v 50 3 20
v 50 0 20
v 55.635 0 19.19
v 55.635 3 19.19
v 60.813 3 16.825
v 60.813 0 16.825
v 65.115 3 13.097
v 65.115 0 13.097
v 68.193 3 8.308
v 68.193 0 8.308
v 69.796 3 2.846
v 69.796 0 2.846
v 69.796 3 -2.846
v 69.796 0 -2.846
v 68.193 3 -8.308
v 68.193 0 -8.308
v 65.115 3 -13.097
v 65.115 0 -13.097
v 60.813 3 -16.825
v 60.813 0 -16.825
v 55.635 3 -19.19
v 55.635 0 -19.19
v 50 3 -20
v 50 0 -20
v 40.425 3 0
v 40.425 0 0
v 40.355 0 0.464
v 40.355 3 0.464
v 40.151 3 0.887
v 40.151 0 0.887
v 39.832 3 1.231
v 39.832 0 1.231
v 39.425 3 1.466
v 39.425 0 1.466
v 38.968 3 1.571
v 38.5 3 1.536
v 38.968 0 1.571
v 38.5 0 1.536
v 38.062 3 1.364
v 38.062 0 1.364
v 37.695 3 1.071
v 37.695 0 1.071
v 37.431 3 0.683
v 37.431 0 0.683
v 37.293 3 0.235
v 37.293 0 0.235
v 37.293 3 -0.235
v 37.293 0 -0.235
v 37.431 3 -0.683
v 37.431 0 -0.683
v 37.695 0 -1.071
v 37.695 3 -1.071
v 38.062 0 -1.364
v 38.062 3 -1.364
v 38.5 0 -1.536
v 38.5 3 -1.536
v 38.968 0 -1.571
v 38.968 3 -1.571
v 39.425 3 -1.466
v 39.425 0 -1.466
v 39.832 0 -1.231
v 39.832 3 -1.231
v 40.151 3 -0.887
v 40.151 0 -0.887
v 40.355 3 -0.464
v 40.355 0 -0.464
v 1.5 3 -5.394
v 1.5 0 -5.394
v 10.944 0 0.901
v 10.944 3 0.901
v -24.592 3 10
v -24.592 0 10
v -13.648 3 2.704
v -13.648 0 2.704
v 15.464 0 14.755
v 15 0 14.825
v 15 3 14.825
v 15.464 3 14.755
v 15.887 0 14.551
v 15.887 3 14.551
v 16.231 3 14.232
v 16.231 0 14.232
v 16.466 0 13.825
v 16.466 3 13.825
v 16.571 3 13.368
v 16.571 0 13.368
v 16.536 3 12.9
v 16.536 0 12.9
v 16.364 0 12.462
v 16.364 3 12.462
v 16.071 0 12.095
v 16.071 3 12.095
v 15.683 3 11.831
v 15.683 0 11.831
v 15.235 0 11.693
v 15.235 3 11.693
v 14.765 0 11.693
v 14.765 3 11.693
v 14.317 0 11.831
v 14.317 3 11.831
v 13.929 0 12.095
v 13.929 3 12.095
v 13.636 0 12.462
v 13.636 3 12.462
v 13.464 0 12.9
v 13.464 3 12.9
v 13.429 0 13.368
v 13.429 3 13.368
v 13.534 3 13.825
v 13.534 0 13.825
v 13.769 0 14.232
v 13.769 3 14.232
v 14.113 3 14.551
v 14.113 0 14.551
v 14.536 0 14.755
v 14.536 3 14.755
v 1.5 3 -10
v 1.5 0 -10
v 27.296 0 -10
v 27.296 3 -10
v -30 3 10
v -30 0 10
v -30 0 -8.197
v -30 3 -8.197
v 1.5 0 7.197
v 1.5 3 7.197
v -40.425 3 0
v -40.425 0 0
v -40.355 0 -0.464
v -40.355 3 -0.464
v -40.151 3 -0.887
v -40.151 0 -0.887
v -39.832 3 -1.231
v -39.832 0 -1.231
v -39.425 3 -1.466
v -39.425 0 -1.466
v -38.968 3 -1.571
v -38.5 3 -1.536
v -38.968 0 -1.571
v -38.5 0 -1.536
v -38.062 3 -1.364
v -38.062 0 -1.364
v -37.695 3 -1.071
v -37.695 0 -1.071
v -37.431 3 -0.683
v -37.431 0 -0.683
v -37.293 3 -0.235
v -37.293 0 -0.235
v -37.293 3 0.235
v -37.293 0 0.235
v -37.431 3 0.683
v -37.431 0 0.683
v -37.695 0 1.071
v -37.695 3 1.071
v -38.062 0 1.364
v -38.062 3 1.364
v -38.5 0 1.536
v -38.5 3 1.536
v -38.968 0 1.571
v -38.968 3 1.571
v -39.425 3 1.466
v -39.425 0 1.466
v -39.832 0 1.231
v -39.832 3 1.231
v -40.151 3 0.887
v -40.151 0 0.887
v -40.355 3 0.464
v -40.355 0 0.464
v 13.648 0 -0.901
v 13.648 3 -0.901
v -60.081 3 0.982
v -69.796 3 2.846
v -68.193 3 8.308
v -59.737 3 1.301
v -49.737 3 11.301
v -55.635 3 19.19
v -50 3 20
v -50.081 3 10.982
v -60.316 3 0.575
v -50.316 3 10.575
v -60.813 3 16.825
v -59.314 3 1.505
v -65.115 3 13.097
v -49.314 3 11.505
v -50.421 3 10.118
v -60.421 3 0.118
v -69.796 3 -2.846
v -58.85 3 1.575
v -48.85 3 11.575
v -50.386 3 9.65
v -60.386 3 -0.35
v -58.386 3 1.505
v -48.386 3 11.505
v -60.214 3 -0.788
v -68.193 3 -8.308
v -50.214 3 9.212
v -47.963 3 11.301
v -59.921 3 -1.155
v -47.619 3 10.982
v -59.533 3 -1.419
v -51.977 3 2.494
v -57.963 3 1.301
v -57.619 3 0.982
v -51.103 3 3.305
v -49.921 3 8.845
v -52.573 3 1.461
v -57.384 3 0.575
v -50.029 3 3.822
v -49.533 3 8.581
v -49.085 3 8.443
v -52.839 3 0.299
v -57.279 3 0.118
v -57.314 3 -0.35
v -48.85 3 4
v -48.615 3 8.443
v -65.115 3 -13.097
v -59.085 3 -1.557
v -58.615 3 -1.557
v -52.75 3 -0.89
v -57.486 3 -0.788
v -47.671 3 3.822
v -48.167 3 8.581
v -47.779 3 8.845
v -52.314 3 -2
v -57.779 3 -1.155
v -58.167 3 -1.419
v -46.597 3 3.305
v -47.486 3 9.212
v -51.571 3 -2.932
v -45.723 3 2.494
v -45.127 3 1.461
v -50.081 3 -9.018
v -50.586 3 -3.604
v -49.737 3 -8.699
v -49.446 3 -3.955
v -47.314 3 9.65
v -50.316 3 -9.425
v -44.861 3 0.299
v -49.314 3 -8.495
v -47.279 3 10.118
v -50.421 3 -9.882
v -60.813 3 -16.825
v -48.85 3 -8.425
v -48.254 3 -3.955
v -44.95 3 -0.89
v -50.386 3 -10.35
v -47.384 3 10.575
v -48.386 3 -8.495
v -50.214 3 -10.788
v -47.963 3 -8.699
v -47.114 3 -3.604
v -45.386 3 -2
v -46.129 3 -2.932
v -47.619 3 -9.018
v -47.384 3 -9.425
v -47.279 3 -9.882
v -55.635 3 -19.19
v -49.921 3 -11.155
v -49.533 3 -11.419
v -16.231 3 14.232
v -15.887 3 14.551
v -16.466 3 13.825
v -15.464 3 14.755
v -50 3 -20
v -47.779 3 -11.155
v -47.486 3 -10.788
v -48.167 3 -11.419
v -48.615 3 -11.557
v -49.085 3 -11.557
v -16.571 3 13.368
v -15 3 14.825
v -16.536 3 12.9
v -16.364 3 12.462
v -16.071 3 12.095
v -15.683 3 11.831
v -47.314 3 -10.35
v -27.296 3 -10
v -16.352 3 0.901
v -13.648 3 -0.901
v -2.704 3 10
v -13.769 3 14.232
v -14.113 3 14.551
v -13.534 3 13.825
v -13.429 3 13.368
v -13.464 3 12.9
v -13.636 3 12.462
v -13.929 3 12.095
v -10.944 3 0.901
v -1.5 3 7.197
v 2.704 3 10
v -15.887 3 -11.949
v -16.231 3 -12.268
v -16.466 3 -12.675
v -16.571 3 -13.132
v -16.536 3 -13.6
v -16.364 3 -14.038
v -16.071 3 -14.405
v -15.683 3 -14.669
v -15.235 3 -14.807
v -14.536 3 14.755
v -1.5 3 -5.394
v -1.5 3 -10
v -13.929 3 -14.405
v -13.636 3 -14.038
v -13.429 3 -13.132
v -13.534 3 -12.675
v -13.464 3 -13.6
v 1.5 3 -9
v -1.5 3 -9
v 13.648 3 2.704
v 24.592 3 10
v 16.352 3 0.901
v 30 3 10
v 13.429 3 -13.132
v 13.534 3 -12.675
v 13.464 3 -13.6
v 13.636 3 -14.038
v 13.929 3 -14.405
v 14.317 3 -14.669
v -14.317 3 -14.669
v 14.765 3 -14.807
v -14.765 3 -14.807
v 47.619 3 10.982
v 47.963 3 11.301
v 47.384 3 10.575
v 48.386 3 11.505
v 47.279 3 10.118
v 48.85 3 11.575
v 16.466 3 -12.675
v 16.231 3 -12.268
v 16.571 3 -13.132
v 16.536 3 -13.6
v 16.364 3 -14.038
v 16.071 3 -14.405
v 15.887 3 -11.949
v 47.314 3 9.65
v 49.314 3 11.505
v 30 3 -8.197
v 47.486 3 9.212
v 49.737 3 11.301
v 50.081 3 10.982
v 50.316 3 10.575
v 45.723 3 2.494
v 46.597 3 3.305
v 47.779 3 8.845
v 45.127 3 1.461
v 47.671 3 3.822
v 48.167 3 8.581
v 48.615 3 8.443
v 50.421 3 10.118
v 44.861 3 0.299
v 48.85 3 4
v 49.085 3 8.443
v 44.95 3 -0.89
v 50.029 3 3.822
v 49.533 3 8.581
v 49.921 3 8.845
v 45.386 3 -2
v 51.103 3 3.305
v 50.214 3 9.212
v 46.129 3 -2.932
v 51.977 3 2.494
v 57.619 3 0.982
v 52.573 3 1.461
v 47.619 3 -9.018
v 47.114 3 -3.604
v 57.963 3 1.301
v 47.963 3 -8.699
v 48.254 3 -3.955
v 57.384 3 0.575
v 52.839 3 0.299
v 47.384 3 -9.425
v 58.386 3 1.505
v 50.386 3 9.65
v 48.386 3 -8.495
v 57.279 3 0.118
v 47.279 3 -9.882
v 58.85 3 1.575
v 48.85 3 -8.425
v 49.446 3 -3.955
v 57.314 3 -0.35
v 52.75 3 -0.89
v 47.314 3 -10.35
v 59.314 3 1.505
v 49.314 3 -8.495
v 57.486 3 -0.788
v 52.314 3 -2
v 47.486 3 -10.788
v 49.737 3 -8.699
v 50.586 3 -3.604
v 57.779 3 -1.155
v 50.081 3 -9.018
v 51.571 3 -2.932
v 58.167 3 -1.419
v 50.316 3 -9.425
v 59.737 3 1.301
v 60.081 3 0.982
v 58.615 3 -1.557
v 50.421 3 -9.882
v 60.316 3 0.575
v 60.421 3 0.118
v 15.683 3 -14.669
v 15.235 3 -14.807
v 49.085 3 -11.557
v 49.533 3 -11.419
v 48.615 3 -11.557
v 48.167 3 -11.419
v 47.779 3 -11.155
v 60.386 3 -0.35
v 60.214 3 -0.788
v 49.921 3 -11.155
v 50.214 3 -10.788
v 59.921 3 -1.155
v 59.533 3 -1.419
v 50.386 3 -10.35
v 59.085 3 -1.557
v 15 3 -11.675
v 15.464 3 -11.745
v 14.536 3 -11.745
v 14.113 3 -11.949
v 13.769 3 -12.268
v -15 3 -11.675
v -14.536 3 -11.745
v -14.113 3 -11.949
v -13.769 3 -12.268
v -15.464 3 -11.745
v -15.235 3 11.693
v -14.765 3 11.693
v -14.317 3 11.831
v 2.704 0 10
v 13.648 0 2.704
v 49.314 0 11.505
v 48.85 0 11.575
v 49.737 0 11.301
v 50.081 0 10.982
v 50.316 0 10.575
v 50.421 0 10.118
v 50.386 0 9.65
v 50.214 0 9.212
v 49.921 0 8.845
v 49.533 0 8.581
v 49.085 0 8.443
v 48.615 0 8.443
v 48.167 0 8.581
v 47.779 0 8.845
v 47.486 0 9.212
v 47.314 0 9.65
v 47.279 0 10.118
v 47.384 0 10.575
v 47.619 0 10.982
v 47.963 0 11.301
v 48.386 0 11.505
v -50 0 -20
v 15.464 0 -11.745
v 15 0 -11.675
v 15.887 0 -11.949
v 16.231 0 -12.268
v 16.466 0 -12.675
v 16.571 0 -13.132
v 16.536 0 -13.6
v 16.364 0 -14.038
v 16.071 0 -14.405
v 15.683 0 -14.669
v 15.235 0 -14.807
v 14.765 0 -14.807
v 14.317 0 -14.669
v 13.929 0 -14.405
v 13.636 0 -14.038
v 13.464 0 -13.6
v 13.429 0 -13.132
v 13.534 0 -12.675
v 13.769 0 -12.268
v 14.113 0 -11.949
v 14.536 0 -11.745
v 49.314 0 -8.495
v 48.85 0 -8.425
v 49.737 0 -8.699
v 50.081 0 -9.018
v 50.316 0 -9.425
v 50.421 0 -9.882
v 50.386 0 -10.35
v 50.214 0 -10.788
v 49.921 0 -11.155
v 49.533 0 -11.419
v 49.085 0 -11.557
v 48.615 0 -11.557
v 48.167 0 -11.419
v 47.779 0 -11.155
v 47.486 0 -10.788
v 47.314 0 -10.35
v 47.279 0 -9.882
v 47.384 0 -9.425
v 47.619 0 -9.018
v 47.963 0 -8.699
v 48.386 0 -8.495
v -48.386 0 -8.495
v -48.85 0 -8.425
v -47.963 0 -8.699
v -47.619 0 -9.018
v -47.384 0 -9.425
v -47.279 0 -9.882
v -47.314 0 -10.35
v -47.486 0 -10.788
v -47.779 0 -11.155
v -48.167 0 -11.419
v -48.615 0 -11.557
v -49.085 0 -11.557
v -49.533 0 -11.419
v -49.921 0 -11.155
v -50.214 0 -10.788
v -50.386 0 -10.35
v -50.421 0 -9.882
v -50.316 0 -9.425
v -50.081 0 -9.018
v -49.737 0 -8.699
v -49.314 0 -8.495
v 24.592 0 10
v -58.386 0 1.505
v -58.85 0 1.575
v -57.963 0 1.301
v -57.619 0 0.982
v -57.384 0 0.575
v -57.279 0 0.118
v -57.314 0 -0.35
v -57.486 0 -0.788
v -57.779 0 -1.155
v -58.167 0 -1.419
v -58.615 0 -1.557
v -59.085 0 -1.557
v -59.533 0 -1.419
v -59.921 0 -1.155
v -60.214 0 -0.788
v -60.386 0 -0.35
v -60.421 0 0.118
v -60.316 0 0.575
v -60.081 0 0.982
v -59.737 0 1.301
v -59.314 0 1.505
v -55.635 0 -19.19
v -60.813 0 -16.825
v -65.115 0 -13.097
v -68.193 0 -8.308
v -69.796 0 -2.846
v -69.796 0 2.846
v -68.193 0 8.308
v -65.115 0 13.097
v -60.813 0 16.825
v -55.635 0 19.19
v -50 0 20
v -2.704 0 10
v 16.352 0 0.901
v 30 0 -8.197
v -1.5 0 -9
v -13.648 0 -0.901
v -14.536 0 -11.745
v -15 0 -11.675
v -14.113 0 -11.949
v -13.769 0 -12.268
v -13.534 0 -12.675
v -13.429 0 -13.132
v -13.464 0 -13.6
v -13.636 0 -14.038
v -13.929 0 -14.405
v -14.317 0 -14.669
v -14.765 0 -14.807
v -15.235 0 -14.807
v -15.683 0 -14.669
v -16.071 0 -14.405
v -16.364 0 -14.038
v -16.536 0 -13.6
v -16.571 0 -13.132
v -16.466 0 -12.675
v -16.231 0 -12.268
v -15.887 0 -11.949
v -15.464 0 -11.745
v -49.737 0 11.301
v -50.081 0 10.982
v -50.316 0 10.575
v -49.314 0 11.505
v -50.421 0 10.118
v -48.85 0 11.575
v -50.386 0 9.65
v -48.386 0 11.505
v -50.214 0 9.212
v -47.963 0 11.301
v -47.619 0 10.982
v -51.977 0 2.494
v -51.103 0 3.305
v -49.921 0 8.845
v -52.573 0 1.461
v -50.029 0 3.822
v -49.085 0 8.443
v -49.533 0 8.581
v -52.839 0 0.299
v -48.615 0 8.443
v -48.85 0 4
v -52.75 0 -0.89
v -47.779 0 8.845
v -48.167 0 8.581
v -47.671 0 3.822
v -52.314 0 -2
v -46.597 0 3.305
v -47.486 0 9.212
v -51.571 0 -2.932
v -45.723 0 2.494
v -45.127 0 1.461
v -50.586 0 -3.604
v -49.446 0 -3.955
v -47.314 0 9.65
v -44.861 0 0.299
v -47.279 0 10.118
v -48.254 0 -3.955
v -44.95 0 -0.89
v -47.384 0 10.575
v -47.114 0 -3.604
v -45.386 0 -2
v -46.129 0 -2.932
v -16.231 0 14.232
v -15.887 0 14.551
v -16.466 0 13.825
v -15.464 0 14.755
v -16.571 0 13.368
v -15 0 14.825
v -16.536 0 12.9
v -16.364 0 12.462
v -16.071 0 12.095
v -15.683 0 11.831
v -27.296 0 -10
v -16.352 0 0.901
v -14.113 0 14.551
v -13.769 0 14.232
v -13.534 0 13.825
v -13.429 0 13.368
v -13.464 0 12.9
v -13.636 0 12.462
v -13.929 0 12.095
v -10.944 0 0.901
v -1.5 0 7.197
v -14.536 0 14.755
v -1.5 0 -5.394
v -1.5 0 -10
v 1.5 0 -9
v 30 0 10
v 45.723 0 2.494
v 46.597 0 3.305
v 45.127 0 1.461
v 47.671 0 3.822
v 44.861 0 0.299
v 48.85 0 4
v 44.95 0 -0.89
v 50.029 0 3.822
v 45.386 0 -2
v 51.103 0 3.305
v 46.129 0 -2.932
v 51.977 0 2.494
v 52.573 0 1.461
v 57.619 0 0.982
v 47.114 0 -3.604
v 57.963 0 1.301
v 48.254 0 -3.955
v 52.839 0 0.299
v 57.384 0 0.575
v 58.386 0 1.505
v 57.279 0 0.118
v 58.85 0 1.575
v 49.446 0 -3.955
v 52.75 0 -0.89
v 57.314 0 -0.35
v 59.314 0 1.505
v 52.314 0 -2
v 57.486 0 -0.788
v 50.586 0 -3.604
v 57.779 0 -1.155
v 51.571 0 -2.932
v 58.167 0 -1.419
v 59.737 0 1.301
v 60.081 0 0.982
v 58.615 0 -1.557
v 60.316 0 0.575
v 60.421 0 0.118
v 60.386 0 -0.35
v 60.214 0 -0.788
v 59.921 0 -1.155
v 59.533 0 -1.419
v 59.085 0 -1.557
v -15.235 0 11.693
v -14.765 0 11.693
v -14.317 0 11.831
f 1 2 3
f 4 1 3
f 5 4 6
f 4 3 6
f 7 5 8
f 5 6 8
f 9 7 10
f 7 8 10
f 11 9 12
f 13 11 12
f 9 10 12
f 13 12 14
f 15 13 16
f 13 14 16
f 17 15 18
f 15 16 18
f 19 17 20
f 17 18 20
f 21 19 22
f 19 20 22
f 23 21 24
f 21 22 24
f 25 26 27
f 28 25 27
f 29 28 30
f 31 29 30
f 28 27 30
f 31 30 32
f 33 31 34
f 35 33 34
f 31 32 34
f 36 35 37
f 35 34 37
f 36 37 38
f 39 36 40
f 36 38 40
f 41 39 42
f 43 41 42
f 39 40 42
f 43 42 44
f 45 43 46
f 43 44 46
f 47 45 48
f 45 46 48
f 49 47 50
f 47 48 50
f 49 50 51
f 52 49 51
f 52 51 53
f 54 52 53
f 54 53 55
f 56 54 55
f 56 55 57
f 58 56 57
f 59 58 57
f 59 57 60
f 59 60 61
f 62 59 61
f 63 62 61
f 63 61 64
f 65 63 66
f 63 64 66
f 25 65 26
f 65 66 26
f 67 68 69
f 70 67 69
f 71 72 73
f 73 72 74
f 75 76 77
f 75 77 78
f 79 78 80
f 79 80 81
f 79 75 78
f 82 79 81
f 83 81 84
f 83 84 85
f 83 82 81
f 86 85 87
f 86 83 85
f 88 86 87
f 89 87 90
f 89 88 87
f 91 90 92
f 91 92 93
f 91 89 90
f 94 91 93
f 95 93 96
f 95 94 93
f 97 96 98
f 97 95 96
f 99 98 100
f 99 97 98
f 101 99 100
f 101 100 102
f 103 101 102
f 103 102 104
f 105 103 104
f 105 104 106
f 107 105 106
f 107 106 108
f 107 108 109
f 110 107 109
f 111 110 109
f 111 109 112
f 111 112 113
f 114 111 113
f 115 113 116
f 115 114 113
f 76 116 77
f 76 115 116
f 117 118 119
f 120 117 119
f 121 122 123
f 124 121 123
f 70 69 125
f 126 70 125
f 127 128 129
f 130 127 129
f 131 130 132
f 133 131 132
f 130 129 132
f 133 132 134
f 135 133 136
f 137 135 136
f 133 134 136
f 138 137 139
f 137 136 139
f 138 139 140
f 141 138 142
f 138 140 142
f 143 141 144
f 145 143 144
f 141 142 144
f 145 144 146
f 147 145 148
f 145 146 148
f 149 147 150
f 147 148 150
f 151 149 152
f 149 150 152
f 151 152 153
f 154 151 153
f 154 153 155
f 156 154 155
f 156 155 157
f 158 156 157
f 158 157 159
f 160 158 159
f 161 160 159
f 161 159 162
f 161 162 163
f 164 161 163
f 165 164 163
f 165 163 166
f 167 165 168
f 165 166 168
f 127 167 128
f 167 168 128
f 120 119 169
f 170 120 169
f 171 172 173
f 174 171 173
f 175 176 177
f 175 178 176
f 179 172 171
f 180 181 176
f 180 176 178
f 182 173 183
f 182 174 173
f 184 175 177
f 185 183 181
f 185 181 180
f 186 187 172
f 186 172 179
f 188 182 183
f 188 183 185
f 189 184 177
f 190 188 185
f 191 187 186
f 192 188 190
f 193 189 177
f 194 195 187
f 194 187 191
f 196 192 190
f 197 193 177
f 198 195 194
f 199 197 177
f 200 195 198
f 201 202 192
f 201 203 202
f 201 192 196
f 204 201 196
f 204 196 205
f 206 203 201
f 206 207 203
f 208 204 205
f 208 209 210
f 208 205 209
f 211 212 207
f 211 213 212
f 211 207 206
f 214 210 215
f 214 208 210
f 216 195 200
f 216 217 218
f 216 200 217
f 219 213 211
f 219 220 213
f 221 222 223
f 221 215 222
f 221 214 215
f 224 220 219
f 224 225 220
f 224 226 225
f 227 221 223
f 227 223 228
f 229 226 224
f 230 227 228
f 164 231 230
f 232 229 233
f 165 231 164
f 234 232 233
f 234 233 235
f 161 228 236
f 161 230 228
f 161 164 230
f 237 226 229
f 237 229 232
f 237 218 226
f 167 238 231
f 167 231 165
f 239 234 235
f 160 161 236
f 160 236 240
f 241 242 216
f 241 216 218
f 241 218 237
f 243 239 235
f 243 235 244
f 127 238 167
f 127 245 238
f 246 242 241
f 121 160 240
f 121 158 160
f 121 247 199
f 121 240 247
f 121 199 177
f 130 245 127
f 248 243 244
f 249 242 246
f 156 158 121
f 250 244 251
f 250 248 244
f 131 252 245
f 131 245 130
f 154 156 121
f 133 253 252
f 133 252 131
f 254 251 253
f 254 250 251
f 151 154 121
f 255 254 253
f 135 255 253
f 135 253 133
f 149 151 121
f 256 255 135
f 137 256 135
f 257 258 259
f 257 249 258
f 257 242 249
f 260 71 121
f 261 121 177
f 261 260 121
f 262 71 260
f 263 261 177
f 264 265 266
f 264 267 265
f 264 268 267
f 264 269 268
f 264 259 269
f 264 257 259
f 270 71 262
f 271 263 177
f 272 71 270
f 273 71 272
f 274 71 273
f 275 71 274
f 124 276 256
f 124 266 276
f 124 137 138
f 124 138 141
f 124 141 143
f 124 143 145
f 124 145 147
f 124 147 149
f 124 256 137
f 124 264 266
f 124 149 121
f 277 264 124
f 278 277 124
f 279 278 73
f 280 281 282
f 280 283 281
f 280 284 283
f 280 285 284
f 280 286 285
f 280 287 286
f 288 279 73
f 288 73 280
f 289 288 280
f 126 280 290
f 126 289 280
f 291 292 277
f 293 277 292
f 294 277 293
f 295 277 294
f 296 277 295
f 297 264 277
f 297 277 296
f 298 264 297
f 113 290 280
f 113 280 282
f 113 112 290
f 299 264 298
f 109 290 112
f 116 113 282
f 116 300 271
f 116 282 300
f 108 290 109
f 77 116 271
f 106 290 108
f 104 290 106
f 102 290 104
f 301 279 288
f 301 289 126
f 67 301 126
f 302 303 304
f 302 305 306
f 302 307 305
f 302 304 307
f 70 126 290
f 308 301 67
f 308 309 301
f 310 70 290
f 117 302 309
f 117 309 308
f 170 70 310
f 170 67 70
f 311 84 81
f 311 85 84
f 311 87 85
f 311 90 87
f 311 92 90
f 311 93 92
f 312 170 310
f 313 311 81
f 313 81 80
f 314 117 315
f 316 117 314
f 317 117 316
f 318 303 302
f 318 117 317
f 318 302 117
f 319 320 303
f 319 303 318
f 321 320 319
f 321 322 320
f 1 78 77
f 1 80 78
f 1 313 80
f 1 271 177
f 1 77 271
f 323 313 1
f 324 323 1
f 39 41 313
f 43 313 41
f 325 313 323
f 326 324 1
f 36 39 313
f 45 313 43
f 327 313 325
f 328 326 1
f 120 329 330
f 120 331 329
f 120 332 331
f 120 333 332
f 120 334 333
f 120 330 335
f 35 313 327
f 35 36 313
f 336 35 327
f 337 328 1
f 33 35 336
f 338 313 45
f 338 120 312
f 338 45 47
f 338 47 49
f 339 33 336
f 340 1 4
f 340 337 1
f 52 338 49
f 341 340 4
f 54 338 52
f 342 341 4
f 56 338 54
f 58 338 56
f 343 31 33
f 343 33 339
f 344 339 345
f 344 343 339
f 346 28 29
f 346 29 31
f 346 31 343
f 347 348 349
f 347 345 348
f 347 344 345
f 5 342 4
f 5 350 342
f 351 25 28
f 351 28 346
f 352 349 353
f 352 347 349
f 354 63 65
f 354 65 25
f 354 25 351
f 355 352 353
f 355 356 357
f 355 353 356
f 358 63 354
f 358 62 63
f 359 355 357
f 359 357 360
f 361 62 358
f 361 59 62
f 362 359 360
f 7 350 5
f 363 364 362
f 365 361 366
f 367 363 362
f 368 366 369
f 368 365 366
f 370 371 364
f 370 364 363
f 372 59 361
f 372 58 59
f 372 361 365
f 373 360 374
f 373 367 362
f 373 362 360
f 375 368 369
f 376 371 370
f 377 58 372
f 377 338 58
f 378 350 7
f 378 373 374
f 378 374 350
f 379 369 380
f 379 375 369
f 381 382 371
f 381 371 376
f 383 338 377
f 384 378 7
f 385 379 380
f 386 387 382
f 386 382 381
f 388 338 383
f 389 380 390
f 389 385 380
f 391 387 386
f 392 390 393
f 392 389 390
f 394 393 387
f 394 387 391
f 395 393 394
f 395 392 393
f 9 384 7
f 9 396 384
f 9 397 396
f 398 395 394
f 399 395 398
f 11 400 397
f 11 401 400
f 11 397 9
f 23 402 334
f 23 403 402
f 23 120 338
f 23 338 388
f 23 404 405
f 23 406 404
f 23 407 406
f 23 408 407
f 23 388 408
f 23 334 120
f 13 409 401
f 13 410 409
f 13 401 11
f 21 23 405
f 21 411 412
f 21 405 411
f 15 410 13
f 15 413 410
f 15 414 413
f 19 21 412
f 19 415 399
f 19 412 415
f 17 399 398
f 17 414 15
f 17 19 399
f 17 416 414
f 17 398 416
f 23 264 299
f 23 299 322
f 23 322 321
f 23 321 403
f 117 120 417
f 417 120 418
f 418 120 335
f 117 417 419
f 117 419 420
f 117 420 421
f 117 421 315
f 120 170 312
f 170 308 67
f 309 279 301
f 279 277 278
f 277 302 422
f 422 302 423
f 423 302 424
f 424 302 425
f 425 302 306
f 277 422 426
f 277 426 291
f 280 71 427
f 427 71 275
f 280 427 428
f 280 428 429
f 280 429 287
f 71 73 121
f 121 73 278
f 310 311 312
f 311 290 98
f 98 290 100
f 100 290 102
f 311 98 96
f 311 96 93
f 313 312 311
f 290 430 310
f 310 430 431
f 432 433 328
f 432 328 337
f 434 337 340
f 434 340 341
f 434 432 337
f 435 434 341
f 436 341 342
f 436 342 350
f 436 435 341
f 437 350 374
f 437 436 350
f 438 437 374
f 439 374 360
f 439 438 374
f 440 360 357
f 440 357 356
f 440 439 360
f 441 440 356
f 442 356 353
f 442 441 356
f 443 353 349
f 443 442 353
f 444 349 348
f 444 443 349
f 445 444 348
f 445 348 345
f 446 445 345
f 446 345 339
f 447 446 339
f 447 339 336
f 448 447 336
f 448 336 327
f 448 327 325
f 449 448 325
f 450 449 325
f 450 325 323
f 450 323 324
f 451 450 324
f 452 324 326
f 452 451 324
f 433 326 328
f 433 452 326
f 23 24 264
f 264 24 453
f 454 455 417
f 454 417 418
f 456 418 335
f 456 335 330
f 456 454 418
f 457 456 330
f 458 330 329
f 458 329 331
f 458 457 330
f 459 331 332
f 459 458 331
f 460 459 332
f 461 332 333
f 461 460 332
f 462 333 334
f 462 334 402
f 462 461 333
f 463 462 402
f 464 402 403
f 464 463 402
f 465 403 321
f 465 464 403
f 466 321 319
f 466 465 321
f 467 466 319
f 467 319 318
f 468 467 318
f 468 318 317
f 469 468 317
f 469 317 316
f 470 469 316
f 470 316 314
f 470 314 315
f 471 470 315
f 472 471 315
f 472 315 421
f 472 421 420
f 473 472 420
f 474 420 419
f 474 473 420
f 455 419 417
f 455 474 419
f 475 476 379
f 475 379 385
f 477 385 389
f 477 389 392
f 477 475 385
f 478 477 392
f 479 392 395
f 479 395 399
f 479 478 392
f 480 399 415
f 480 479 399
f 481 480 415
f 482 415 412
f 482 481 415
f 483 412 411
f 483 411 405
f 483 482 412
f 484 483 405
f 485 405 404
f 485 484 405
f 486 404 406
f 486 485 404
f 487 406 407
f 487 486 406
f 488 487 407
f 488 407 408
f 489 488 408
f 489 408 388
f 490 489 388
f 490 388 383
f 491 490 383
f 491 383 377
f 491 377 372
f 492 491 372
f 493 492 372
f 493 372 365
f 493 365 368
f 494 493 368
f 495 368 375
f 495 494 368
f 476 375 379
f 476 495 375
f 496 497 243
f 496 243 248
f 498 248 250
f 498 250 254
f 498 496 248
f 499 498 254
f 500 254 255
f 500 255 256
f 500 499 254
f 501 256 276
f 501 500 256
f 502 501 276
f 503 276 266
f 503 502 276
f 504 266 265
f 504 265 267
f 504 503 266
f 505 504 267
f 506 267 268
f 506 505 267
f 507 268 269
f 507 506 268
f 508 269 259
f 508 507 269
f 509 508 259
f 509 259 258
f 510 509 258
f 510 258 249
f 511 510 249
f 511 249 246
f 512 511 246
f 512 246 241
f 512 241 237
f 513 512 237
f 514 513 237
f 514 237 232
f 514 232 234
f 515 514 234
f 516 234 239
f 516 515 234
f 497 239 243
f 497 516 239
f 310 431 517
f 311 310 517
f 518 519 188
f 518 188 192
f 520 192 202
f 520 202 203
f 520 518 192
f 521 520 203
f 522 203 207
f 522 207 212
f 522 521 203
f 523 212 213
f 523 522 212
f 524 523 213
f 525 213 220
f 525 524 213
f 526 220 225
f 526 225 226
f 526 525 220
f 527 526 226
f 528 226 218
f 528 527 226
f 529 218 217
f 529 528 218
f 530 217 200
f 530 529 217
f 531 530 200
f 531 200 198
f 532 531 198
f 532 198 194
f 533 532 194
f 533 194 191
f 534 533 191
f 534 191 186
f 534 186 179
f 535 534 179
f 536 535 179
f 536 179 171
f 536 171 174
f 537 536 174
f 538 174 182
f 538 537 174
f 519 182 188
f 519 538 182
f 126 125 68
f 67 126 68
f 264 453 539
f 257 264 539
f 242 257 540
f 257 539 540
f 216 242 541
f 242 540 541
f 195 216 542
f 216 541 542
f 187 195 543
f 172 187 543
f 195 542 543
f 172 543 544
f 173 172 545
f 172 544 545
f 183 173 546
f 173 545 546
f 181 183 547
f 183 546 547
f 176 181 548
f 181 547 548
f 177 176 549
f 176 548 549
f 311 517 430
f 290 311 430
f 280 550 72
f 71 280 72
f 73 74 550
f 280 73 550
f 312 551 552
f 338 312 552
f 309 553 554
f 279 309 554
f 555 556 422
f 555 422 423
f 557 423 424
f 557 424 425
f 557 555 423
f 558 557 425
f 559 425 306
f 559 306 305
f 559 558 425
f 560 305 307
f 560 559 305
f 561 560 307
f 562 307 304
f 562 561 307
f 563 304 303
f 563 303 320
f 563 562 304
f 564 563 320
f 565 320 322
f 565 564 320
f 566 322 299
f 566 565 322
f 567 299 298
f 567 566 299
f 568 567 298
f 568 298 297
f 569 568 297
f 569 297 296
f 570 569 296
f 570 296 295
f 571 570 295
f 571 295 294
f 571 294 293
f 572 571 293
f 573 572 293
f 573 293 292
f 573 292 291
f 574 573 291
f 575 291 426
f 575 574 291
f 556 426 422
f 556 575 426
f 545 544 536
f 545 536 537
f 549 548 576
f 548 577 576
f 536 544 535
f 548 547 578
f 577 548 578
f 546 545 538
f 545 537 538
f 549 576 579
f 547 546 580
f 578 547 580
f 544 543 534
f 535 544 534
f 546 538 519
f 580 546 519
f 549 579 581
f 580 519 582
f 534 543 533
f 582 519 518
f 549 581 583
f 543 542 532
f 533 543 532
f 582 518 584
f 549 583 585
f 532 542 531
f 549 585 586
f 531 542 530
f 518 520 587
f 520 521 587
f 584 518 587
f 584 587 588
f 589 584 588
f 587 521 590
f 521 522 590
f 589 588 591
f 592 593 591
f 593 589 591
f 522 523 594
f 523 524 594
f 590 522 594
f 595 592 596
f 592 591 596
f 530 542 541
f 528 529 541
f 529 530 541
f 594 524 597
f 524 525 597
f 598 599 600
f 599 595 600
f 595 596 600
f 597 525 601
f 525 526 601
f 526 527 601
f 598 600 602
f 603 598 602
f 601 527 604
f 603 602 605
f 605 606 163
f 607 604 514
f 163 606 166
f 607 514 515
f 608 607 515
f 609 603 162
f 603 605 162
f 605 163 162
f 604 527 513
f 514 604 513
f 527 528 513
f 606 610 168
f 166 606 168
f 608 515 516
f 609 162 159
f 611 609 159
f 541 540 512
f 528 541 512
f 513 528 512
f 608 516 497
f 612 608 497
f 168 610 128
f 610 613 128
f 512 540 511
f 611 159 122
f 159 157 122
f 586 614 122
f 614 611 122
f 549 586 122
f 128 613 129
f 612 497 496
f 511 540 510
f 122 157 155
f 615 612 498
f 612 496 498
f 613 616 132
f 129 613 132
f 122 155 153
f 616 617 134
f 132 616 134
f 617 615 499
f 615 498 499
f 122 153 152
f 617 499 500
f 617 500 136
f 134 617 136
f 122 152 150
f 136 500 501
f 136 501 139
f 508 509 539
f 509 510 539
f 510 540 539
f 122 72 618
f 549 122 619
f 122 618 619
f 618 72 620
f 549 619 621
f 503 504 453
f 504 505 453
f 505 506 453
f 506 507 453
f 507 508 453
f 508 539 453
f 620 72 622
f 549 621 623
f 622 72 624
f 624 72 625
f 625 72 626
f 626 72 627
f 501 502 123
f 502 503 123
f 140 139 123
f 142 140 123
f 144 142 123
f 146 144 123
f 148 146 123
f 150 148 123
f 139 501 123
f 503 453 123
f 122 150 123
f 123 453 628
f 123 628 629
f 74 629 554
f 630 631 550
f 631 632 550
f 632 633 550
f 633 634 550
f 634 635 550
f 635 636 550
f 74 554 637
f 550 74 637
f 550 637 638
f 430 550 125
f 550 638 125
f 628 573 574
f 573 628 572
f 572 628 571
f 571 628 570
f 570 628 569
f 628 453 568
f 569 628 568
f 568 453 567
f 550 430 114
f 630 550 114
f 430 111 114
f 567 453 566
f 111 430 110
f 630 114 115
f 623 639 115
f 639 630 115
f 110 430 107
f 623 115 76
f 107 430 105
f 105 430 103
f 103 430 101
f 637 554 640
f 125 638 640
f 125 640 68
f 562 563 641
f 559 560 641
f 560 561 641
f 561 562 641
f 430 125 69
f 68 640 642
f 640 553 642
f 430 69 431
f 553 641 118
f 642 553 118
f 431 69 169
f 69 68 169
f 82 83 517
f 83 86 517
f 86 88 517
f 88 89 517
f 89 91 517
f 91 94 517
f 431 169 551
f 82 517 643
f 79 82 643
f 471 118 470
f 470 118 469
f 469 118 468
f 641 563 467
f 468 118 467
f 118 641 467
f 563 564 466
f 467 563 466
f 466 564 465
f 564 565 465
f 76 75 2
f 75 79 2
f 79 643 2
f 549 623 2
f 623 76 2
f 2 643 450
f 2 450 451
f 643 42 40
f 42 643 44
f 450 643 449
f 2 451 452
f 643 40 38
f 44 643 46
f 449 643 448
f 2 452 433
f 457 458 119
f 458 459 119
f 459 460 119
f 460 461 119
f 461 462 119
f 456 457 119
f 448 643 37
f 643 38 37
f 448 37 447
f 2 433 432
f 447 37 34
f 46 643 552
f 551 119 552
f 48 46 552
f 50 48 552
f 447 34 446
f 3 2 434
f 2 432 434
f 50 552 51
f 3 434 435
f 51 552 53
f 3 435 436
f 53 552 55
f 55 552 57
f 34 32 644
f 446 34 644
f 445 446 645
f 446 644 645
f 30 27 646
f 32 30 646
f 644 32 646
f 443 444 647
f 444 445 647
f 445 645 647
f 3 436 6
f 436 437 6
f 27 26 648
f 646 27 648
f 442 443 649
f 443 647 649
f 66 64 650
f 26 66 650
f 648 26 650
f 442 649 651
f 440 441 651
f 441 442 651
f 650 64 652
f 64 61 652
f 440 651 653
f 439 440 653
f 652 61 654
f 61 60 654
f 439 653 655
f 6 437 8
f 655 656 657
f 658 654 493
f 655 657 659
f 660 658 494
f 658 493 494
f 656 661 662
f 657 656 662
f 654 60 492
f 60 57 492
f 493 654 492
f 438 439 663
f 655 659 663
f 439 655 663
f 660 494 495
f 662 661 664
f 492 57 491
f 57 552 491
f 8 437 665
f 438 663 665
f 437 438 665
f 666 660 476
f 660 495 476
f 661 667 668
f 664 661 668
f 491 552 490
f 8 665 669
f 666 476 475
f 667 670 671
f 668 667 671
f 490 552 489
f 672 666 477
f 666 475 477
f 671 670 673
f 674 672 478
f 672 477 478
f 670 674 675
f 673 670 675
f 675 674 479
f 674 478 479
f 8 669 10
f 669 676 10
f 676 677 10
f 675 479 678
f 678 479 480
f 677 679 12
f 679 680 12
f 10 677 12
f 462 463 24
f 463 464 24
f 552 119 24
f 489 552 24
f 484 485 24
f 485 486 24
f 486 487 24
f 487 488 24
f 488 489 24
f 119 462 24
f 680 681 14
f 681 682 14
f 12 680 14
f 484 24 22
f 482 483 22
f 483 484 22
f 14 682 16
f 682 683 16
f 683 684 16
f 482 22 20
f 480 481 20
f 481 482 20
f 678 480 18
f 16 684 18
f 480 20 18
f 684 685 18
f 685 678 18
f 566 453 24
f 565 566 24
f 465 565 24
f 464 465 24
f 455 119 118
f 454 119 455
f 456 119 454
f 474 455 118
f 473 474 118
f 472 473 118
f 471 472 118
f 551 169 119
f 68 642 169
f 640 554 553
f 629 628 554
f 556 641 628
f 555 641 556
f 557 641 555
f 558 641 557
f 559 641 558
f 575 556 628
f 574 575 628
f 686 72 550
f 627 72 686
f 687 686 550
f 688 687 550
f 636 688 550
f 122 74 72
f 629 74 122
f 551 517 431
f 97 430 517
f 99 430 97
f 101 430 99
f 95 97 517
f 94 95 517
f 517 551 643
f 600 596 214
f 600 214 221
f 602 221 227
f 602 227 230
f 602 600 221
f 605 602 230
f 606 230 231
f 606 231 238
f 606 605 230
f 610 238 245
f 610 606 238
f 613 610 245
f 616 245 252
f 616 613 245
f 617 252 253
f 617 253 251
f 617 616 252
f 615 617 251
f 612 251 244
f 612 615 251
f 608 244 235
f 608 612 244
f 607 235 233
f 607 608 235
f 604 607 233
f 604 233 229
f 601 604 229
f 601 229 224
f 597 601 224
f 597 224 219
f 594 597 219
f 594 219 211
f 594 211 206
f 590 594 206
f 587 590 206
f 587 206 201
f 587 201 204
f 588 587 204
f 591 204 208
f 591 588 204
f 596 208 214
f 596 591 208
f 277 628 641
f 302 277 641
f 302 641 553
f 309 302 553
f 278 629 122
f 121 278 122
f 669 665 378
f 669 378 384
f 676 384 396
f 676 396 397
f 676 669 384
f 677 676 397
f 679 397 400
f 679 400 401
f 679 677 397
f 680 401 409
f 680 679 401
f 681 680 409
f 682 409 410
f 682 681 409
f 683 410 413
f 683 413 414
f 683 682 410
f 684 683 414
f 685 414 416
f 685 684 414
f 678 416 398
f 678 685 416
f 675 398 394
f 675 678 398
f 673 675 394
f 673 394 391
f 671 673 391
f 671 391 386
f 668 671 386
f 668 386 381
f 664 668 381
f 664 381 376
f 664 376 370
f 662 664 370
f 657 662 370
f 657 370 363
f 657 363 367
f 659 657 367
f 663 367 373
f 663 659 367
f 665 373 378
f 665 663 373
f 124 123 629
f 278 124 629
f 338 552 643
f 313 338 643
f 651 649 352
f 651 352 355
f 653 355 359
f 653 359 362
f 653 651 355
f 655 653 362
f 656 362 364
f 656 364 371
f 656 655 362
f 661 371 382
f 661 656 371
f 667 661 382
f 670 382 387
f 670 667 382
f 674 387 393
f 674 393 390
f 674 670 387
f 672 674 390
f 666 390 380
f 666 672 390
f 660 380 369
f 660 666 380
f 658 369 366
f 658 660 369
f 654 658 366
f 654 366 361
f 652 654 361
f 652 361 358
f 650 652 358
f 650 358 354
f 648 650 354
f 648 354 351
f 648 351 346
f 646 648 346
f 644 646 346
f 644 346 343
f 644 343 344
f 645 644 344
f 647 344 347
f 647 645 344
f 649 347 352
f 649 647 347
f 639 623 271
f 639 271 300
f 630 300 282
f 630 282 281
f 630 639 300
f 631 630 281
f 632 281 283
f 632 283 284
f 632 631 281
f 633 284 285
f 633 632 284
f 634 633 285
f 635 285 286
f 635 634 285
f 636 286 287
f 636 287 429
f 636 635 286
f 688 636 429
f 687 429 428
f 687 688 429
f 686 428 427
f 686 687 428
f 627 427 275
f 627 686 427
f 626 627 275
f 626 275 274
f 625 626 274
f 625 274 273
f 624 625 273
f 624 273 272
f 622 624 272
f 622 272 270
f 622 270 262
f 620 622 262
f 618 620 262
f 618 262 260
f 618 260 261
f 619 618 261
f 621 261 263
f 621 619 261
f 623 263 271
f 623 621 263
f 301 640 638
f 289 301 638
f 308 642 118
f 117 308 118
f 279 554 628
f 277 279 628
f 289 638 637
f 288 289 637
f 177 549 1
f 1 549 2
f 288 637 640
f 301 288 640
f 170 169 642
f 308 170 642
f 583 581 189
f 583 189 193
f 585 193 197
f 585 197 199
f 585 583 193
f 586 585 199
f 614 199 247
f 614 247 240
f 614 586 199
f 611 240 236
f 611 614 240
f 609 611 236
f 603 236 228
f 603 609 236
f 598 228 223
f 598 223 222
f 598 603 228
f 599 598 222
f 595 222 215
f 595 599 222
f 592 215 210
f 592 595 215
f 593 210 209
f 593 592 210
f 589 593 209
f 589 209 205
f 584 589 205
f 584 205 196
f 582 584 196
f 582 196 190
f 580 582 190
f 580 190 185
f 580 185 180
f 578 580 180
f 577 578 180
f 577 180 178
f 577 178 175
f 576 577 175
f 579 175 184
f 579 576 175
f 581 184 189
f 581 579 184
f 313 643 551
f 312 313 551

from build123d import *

# Parameters (mm, degrees)
SKETCH1_R           = 1.575
SKETCH1_R_2         = 4
BOSS_EXTRUDE1_DEPTH = 3
BOSS_EXTRUDE2_DEPTH = 3


with BuildPart() as part:
    # Sketch1 → Boss-Extrude1 (new body)
    with BuildSketch(Plane(origin=(0, 0, 0), x_dir=(1, 0, 0), z_dir=(0, 1, 0))):
        with BuildLine():
            Line((-15, 20), (-50, 20))
            ThreePointArc((-50, 20), (-70, 0), (-50, -20))
            Line((-50, -20), (50, -20))
            ThreePointArc((50, -20), (70, 0), (50, 20))
            Line((50, 20), (-15, 20))
        make_face()
        with Locations(Location((-48.85, -10, 0), (0, 0, 270))):
            Circle(SKETCH1_R, mode=Mode.SUBTRACT)
        with Locations(Location((-15, -13.25, 0), (0, 0, 270))):
            Circle(SKETCH1_R, mode=Mode.SUBTRACT)
        with BuildLine():
            ThreePointArc((-37.275, 0), (-38.85, -1.575), (-40.425, 0))
            ThreePointArc((-40.425, 0), (-38.85, 1.575), (-37.275, 0))
        make_face(mode=Mode.SUBTRACT)
        Polygon((-2.704163457, -10), (-24.591673087, -10), (-13.647918272, -2.704163457), align=None, mode=Mode.SUBTRACT)
        Polygon((-30, -10), (-30, 8.197224362), (-16.352081728, -0.901387819), align=None, mode=Mode.SUBTRACT)
        Polygon((-27.295836543, 10), (27.295836543, 10), (13.647918272, 0.901387819), (1.5, 9), (1.5, 5.394448725), (10.943754815, -0.901387819), (1.5, -7.197224362), (1.5, -10), (-1.5, -10), (-1.5, -7.197224362), (-10.943754815, -0.901387819), (-1.5, 5.394448725), (-1.5, 9), (-13.647918272, 0.901387819), align=None, mode=Mode.SUBTRACT)
        with Locations(Location((15, -13.25, 0), (0, 0, 270))):
            Circle(SKETCH1_R, mode=Mode.SUBTRACT)
        with Locations(Location((48.85, -10, 0), (0, 0, 270))):
            Circle(SKETCH1_R, mode=Mode.SUBTRACT)
        Polygon((24.591673087, -10), (2.704163457, -10), (13.647918272, -2.704163457), align=None, mode=Mode.SUBTRACT)
        Polygon((30, 8.197224362), (30, -10), (16.352081728, -0.901387819), align=None, mode=Mode.SUBTRACT)
        with Locations(Location((58.85, 0, 0), (0, 0, 270))):
            Circle(SKETCH1_R, mode=Mode.SUBTRACT)
        with Locations(Location((-58.85, 0, 0), (0, 0, 270))):
            Circle(SKETCH1_R, mode=Mode.SUBTRACT)
        with Locations(Location((-48.85, 0, 0), (0, 0, 270))):
            Circle(SKETCH1_R_2, mode=Mode.SUBTRACT)
        with Locations(Location((-48.85, 10, 0), (0, 0, 270))):
            Circle(SKETCH1_R, mode=Mode.SUBTRACT)
        with Locations(Location((-15, 13.25, 0), (0, 0, 270))):
            Circle(SKETCH1_R, mode=Mode.SUBTRACT)
        with BuildLine():
            ThreePointArc((37.275, 0), (38.85, 1.575), (40.425, 0))
            ThreePointArc((40.425, 0), (38.85, -1.575), (37.275, 0))
        make_face(mode=Mode.SUBTRACT)
        with Locations(Location((48.85, 0, 0), (0, 0, 270))):
            Circle(SKETCH1_R_2, mode=Mode.SUBTRACT)
        with Locations(Location((15, 13.25, 0), (0, 0, 270))):
            Circle(SKETCH1_R, mode=Mode.SUBTRACT)
        with Locations(Location((48.85, 10, 0), (0, 0, 270))):
            Circle(SKETCH1_R, mode=Mode.SUBTRACT)
    extrude(amount=BOSS_EXTRUDE1_DEPTH)

    # Sketch1<3> → Boss-Extrude2 (add)
    with BuildSketch(Plane(origin=(0, 0, 0), x_dir=(1, 0, 0), z_dir=(0, 1, 0))):
        Polygon((-1.5, -10), (0, -10), (0, 10), (-1.5, 9), (-1.5, 5.394448725), (-1.5, -7.197224362), align=None)
        Polygon((0, 10), (0, -10), (1.5, -10), (1.5, -7.197224362), (1.5, 5.394448725), (1.5, 9), align=None)
        Polygon((1.5, 10), (0, 10), (1.5, 9), align=None)
        Polygon((-1.5, 9), (0, 10), (-1.5, 10), align=None)
    extrude(amount=BOSS_EXTRUDE2_DEPTH)


solid = part.part
